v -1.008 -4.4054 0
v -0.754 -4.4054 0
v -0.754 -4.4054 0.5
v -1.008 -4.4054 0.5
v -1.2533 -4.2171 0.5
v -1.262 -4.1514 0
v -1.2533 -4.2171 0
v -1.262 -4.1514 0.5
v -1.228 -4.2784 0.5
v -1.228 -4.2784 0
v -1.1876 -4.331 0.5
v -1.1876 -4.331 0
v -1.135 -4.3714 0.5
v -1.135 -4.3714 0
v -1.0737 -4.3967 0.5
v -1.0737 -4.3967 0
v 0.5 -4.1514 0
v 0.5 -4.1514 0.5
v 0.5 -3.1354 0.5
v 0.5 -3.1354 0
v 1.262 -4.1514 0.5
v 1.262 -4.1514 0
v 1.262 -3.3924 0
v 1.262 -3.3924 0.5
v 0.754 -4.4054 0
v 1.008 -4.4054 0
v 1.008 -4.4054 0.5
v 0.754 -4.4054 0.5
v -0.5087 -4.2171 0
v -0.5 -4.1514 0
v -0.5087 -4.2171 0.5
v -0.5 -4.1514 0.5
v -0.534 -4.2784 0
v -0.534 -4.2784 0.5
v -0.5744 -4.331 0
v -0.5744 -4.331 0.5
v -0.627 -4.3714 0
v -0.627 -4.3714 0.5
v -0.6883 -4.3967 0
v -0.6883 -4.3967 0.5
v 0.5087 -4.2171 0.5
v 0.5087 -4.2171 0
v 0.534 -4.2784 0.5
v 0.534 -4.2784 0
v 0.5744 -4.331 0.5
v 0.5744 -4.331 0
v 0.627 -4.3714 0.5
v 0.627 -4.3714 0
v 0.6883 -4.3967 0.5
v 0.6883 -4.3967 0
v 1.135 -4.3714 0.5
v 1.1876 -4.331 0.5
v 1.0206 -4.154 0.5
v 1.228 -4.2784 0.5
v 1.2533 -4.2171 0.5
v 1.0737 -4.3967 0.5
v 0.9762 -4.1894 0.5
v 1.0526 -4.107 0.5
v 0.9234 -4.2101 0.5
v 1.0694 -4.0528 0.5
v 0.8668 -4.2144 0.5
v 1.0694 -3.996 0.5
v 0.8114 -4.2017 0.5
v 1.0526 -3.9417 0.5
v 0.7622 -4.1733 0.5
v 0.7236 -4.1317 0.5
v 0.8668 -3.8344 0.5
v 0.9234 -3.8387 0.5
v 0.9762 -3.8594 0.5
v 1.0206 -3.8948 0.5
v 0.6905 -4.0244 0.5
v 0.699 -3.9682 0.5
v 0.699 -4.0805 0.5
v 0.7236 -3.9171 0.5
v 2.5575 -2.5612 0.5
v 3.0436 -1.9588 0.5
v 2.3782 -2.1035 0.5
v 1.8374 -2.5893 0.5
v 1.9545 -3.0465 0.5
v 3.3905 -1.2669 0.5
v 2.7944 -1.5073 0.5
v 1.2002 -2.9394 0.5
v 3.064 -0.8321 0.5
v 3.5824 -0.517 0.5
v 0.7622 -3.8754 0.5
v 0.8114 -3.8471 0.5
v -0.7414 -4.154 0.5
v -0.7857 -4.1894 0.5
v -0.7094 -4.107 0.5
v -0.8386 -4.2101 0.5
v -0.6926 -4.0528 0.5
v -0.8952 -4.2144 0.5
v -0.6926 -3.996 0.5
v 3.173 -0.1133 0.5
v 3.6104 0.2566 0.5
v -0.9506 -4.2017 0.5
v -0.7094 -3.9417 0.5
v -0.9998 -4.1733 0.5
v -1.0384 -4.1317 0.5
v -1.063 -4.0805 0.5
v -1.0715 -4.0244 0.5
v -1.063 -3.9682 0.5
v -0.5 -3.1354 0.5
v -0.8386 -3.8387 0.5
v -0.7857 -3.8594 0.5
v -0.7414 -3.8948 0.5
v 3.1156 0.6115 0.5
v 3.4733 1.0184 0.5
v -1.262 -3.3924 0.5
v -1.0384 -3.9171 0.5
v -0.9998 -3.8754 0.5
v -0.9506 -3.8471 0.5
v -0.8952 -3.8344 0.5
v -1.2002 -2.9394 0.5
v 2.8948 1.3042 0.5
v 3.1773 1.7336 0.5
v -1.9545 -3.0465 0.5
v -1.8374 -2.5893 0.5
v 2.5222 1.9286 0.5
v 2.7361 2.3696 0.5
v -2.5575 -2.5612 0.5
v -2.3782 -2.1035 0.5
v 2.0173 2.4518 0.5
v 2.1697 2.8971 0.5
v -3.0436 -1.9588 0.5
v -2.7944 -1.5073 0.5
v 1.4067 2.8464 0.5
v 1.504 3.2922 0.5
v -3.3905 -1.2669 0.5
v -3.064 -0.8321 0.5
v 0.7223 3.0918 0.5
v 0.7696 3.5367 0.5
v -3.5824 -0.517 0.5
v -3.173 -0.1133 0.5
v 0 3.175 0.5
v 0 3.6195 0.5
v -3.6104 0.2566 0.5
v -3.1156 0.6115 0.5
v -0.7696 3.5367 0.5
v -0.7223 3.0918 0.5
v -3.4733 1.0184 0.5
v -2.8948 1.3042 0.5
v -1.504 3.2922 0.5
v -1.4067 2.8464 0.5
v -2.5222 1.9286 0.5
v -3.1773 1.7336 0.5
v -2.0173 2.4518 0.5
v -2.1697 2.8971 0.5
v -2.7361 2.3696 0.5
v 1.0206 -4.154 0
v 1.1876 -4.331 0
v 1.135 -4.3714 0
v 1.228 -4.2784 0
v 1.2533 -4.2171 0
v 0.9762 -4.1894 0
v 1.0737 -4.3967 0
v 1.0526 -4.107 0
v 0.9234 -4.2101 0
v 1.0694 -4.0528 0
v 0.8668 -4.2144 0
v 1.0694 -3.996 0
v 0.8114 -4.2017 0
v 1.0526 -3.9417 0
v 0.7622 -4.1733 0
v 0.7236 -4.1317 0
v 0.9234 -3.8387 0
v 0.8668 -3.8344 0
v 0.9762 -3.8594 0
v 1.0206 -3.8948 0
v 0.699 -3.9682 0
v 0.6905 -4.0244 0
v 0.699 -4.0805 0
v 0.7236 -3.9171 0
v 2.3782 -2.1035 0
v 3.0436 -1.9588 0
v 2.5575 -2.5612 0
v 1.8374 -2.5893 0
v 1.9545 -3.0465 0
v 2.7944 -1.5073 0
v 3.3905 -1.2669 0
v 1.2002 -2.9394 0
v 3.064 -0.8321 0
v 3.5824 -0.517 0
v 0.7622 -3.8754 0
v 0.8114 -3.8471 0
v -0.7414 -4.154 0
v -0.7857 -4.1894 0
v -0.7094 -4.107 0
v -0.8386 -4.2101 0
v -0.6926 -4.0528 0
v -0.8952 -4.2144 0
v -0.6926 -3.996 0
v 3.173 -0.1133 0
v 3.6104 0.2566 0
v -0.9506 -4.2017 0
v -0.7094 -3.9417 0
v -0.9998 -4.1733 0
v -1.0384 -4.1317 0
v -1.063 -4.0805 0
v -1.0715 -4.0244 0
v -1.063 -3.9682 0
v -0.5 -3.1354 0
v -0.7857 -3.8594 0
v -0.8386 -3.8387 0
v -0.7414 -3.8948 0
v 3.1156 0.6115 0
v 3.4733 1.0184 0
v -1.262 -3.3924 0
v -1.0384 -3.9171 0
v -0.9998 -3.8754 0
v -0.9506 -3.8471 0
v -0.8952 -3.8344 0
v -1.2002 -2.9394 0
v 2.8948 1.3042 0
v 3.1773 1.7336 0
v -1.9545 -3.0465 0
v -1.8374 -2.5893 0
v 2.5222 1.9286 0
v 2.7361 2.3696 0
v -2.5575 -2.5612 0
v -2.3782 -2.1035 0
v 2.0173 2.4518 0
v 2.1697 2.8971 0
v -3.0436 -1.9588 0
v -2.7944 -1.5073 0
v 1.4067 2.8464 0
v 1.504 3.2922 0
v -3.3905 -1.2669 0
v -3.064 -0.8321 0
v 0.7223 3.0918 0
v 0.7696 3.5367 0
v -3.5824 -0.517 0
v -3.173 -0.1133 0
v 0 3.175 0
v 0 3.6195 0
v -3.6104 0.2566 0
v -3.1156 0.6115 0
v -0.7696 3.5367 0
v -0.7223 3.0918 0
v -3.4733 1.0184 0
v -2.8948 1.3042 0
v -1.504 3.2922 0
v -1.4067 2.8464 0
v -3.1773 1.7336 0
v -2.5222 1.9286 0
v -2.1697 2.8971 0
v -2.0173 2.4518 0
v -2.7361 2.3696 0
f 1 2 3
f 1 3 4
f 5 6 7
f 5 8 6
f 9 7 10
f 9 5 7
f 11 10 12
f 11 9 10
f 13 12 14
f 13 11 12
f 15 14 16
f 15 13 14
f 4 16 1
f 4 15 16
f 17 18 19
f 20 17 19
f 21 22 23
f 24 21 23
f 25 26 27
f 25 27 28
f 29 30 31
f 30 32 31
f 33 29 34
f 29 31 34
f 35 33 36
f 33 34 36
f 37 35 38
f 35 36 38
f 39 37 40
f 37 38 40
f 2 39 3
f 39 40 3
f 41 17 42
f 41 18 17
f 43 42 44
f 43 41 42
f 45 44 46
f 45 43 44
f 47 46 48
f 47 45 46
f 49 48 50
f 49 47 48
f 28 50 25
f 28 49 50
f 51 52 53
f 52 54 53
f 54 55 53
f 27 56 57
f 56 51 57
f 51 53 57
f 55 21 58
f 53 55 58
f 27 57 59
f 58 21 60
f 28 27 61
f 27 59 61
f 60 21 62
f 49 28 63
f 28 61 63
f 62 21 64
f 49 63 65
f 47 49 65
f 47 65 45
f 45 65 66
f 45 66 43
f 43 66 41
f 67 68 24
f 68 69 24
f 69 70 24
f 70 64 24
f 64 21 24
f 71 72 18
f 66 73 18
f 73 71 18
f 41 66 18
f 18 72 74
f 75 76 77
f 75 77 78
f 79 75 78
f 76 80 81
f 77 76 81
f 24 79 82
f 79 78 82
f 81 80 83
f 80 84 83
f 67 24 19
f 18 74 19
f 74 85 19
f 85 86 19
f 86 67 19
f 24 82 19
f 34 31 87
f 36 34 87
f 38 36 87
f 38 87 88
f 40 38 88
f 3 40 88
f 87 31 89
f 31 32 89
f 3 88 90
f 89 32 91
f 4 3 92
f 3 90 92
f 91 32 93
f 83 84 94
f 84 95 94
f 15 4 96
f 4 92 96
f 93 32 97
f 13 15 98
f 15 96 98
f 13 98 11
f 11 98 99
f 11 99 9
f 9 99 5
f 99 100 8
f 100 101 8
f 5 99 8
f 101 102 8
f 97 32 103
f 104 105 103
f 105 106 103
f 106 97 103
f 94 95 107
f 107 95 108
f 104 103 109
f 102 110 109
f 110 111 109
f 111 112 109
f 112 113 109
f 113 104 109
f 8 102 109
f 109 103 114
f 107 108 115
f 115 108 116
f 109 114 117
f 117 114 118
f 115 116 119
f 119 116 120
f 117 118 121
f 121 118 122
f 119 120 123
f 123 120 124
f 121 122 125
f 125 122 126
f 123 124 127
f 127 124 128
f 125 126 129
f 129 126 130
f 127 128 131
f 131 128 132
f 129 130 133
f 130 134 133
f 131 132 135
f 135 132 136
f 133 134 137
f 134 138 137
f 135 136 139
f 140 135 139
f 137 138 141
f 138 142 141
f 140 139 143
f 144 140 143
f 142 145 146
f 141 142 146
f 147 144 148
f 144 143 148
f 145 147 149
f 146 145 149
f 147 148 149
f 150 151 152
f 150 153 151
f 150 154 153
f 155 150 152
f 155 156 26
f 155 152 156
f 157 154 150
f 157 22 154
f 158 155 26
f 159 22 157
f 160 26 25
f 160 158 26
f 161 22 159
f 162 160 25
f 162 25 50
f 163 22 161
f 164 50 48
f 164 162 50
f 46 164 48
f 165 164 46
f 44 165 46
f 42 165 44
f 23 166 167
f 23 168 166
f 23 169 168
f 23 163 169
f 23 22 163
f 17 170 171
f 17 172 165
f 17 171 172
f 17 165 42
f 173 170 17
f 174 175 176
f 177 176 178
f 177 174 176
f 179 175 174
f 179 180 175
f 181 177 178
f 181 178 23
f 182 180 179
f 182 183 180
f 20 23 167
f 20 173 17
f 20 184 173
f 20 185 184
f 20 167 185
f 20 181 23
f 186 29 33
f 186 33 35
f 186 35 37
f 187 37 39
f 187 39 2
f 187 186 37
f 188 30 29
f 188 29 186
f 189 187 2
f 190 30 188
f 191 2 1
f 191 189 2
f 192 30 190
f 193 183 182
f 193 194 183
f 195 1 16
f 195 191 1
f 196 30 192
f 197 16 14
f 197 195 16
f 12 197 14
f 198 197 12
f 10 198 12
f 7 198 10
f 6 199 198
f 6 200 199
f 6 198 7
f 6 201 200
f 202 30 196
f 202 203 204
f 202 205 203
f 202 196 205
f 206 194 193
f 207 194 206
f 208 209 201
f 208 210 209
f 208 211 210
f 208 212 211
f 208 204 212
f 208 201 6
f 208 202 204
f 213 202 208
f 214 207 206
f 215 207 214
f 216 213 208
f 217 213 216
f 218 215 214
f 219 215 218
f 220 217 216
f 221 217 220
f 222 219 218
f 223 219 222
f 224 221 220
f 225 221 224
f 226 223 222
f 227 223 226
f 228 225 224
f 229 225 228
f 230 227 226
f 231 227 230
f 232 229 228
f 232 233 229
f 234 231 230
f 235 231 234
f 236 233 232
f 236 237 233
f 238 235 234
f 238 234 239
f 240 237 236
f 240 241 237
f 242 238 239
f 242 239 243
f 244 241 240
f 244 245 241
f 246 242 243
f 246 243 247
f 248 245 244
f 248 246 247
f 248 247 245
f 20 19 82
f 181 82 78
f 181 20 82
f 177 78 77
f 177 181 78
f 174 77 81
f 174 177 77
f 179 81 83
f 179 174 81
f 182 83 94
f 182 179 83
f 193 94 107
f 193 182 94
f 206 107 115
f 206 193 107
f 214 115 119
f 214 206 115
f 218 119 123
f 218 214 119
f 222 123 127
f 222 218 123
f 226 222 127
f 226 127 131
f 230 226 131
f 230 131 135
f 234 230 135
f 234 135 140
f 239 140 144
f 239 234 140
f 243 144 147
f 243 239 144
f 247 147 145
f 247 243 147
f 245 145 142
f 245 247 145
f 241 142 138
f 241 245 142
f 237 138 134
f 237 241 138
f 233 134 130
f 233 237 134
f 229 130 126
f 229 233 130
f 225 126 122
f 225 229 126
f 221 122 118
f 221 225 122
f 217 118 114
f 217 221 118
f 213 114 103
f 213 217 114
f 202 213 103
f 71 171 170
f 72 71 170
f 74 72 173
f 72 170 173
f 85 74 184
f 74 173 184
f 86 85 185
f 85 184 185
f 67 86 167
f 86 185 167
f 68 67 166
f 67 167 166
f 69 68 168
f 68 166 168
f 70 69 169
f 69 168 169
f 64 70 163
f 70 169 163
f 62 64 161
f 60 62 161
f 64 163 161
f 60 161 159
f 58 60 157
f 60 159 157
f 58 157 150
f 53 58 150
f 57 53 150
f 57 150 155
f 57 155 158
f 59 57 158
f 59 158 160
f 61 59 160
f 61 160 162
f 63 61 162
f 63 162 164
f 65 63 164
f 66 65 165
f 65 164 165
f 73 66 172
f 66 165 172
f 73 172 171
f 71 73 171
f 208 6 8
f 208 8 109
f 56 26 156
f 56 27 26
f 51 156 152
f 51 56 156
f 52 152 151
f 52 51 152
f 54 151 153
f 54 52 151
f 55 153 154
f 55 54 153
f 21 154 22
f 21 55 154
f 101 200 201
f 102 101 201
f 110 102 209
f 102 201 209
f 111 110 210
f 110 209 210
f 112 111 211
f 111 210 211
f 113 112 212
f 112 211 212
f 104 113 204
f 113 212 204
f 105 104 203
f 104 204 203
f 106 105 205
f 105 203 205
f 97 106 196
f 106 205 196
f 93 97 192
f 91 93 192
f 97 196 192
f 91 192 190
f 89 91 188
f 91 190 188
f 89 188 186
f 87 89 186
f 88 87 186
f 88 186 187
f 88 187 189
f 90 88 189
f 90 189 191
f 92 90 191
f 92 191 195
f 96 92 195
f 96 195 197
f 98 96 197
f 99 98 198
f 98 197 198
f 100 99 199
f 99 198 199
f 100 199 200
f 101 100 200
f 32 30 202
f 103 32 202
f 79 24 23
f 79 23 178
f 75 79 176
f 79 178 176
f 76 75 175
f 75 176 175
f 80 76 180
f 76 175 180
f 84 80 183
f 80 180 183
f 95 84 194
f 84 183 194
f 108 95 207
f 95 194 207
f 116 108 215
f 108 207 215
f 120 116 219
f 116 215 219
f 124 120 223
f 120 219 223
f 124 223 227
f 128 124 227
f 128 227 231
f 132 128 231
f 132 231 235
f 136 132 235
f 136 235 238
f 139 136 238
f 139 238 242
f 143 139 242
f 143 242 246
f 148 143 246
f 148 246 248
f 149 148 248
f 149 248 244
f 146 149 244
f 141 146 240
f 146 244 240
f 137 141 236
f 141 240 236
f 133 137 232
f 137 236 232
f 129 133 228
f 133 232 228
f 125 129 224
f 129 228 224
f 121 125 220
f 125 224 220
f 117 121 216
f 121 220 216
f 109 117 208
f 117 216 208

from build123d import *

# Parameters (mm, degrees)
SKETCH1_R           = 3.6195
SKETCH1_R_2         = 3.175
BOSS_EXTRUDE1_DEPTH = 0.5
CUT_EXTRUDE1_DEPTH  = 6.143108058
SKETCH3_W           = 0.762
SKETCH3_H           = 1.27
SKETCH3_R           = 0.1905
BOSS_EXTRUDE2_DEPTH = 0.5
FILLET1_R           = 0.254


with BuildPart() as part:
    # Sketch1 → Boss-Extrude1 (new body)
    with BuildSketch(Plane.XY):
        Circle(SKETCH1_R)
        Circle(SKETCH1_R_2, mode=Mode.SUBTRACT)
    extrude(amount=BOSS_EXTRUDE1_DEPTH)

    # Sketch2 → Cut-Extrude1 (cut, through all)
    with BuildSketch(Plane.XY.offset(0.5)):
        Polygon((0.5, -2.208183393), (0.5, -4.13884283), (-0.5, -4.13884283), (-0.5, -2.208183393), (-0.5, 2.208183393), (0.5, 2.208183393), align=None)
    extrude(amount=-CUT_EXTRUDE1_DEPTH, mode=Mode.SUBTRACT)

    # Sketch3 → Boss-Extrude2 (add)
    # profile 1 of 2: a face of its own
    with BuildSketch(Plane(origin=(0, 0, 0), x_dir=(-1, 0, 0), z_dir=(0, 0, -1))):
        with Locations((0.881, -3.770382752)):
            Rectangle(SKETCH3_W, SKETCH3_H)
        with Locations((0.881, -4.024382752)):
            Circle(SKETCH3_R, mode=Mode.SUBTRACT)
    # profile 2 of 2: a face of its own
    with BuildSketch(Plane(origin=(0, 0, 0), x_dir=(-1, 0, 0), z_dir=(0, 0, -1))):
        with Locations((-0.881, -3.770382752)):
            Rectangle(SKETCH3_W, SKETCH3_H)
        with Locations((-0.881, -4.024382752)):
            Circle(SKETCH3_R, mode=Mode.SUBTRACT)
    extrude(amount=-BOSS_EXTRUDE2_DEPTH)

    # Fillet1
    fillet1_edges = [part.edges().sort_by_distance(p)[0] for p in [
        (-0.5, -4.405382752, 0.25),
        (-1.262, -4.405382752, 0.25),
        (1.262, -4.405382752, 0.25),
        (0.5, -4.405382752, 0.25),
    ]]
    fillet(fillet1_edges, radius=FILLET1_R)


solid = part.part
